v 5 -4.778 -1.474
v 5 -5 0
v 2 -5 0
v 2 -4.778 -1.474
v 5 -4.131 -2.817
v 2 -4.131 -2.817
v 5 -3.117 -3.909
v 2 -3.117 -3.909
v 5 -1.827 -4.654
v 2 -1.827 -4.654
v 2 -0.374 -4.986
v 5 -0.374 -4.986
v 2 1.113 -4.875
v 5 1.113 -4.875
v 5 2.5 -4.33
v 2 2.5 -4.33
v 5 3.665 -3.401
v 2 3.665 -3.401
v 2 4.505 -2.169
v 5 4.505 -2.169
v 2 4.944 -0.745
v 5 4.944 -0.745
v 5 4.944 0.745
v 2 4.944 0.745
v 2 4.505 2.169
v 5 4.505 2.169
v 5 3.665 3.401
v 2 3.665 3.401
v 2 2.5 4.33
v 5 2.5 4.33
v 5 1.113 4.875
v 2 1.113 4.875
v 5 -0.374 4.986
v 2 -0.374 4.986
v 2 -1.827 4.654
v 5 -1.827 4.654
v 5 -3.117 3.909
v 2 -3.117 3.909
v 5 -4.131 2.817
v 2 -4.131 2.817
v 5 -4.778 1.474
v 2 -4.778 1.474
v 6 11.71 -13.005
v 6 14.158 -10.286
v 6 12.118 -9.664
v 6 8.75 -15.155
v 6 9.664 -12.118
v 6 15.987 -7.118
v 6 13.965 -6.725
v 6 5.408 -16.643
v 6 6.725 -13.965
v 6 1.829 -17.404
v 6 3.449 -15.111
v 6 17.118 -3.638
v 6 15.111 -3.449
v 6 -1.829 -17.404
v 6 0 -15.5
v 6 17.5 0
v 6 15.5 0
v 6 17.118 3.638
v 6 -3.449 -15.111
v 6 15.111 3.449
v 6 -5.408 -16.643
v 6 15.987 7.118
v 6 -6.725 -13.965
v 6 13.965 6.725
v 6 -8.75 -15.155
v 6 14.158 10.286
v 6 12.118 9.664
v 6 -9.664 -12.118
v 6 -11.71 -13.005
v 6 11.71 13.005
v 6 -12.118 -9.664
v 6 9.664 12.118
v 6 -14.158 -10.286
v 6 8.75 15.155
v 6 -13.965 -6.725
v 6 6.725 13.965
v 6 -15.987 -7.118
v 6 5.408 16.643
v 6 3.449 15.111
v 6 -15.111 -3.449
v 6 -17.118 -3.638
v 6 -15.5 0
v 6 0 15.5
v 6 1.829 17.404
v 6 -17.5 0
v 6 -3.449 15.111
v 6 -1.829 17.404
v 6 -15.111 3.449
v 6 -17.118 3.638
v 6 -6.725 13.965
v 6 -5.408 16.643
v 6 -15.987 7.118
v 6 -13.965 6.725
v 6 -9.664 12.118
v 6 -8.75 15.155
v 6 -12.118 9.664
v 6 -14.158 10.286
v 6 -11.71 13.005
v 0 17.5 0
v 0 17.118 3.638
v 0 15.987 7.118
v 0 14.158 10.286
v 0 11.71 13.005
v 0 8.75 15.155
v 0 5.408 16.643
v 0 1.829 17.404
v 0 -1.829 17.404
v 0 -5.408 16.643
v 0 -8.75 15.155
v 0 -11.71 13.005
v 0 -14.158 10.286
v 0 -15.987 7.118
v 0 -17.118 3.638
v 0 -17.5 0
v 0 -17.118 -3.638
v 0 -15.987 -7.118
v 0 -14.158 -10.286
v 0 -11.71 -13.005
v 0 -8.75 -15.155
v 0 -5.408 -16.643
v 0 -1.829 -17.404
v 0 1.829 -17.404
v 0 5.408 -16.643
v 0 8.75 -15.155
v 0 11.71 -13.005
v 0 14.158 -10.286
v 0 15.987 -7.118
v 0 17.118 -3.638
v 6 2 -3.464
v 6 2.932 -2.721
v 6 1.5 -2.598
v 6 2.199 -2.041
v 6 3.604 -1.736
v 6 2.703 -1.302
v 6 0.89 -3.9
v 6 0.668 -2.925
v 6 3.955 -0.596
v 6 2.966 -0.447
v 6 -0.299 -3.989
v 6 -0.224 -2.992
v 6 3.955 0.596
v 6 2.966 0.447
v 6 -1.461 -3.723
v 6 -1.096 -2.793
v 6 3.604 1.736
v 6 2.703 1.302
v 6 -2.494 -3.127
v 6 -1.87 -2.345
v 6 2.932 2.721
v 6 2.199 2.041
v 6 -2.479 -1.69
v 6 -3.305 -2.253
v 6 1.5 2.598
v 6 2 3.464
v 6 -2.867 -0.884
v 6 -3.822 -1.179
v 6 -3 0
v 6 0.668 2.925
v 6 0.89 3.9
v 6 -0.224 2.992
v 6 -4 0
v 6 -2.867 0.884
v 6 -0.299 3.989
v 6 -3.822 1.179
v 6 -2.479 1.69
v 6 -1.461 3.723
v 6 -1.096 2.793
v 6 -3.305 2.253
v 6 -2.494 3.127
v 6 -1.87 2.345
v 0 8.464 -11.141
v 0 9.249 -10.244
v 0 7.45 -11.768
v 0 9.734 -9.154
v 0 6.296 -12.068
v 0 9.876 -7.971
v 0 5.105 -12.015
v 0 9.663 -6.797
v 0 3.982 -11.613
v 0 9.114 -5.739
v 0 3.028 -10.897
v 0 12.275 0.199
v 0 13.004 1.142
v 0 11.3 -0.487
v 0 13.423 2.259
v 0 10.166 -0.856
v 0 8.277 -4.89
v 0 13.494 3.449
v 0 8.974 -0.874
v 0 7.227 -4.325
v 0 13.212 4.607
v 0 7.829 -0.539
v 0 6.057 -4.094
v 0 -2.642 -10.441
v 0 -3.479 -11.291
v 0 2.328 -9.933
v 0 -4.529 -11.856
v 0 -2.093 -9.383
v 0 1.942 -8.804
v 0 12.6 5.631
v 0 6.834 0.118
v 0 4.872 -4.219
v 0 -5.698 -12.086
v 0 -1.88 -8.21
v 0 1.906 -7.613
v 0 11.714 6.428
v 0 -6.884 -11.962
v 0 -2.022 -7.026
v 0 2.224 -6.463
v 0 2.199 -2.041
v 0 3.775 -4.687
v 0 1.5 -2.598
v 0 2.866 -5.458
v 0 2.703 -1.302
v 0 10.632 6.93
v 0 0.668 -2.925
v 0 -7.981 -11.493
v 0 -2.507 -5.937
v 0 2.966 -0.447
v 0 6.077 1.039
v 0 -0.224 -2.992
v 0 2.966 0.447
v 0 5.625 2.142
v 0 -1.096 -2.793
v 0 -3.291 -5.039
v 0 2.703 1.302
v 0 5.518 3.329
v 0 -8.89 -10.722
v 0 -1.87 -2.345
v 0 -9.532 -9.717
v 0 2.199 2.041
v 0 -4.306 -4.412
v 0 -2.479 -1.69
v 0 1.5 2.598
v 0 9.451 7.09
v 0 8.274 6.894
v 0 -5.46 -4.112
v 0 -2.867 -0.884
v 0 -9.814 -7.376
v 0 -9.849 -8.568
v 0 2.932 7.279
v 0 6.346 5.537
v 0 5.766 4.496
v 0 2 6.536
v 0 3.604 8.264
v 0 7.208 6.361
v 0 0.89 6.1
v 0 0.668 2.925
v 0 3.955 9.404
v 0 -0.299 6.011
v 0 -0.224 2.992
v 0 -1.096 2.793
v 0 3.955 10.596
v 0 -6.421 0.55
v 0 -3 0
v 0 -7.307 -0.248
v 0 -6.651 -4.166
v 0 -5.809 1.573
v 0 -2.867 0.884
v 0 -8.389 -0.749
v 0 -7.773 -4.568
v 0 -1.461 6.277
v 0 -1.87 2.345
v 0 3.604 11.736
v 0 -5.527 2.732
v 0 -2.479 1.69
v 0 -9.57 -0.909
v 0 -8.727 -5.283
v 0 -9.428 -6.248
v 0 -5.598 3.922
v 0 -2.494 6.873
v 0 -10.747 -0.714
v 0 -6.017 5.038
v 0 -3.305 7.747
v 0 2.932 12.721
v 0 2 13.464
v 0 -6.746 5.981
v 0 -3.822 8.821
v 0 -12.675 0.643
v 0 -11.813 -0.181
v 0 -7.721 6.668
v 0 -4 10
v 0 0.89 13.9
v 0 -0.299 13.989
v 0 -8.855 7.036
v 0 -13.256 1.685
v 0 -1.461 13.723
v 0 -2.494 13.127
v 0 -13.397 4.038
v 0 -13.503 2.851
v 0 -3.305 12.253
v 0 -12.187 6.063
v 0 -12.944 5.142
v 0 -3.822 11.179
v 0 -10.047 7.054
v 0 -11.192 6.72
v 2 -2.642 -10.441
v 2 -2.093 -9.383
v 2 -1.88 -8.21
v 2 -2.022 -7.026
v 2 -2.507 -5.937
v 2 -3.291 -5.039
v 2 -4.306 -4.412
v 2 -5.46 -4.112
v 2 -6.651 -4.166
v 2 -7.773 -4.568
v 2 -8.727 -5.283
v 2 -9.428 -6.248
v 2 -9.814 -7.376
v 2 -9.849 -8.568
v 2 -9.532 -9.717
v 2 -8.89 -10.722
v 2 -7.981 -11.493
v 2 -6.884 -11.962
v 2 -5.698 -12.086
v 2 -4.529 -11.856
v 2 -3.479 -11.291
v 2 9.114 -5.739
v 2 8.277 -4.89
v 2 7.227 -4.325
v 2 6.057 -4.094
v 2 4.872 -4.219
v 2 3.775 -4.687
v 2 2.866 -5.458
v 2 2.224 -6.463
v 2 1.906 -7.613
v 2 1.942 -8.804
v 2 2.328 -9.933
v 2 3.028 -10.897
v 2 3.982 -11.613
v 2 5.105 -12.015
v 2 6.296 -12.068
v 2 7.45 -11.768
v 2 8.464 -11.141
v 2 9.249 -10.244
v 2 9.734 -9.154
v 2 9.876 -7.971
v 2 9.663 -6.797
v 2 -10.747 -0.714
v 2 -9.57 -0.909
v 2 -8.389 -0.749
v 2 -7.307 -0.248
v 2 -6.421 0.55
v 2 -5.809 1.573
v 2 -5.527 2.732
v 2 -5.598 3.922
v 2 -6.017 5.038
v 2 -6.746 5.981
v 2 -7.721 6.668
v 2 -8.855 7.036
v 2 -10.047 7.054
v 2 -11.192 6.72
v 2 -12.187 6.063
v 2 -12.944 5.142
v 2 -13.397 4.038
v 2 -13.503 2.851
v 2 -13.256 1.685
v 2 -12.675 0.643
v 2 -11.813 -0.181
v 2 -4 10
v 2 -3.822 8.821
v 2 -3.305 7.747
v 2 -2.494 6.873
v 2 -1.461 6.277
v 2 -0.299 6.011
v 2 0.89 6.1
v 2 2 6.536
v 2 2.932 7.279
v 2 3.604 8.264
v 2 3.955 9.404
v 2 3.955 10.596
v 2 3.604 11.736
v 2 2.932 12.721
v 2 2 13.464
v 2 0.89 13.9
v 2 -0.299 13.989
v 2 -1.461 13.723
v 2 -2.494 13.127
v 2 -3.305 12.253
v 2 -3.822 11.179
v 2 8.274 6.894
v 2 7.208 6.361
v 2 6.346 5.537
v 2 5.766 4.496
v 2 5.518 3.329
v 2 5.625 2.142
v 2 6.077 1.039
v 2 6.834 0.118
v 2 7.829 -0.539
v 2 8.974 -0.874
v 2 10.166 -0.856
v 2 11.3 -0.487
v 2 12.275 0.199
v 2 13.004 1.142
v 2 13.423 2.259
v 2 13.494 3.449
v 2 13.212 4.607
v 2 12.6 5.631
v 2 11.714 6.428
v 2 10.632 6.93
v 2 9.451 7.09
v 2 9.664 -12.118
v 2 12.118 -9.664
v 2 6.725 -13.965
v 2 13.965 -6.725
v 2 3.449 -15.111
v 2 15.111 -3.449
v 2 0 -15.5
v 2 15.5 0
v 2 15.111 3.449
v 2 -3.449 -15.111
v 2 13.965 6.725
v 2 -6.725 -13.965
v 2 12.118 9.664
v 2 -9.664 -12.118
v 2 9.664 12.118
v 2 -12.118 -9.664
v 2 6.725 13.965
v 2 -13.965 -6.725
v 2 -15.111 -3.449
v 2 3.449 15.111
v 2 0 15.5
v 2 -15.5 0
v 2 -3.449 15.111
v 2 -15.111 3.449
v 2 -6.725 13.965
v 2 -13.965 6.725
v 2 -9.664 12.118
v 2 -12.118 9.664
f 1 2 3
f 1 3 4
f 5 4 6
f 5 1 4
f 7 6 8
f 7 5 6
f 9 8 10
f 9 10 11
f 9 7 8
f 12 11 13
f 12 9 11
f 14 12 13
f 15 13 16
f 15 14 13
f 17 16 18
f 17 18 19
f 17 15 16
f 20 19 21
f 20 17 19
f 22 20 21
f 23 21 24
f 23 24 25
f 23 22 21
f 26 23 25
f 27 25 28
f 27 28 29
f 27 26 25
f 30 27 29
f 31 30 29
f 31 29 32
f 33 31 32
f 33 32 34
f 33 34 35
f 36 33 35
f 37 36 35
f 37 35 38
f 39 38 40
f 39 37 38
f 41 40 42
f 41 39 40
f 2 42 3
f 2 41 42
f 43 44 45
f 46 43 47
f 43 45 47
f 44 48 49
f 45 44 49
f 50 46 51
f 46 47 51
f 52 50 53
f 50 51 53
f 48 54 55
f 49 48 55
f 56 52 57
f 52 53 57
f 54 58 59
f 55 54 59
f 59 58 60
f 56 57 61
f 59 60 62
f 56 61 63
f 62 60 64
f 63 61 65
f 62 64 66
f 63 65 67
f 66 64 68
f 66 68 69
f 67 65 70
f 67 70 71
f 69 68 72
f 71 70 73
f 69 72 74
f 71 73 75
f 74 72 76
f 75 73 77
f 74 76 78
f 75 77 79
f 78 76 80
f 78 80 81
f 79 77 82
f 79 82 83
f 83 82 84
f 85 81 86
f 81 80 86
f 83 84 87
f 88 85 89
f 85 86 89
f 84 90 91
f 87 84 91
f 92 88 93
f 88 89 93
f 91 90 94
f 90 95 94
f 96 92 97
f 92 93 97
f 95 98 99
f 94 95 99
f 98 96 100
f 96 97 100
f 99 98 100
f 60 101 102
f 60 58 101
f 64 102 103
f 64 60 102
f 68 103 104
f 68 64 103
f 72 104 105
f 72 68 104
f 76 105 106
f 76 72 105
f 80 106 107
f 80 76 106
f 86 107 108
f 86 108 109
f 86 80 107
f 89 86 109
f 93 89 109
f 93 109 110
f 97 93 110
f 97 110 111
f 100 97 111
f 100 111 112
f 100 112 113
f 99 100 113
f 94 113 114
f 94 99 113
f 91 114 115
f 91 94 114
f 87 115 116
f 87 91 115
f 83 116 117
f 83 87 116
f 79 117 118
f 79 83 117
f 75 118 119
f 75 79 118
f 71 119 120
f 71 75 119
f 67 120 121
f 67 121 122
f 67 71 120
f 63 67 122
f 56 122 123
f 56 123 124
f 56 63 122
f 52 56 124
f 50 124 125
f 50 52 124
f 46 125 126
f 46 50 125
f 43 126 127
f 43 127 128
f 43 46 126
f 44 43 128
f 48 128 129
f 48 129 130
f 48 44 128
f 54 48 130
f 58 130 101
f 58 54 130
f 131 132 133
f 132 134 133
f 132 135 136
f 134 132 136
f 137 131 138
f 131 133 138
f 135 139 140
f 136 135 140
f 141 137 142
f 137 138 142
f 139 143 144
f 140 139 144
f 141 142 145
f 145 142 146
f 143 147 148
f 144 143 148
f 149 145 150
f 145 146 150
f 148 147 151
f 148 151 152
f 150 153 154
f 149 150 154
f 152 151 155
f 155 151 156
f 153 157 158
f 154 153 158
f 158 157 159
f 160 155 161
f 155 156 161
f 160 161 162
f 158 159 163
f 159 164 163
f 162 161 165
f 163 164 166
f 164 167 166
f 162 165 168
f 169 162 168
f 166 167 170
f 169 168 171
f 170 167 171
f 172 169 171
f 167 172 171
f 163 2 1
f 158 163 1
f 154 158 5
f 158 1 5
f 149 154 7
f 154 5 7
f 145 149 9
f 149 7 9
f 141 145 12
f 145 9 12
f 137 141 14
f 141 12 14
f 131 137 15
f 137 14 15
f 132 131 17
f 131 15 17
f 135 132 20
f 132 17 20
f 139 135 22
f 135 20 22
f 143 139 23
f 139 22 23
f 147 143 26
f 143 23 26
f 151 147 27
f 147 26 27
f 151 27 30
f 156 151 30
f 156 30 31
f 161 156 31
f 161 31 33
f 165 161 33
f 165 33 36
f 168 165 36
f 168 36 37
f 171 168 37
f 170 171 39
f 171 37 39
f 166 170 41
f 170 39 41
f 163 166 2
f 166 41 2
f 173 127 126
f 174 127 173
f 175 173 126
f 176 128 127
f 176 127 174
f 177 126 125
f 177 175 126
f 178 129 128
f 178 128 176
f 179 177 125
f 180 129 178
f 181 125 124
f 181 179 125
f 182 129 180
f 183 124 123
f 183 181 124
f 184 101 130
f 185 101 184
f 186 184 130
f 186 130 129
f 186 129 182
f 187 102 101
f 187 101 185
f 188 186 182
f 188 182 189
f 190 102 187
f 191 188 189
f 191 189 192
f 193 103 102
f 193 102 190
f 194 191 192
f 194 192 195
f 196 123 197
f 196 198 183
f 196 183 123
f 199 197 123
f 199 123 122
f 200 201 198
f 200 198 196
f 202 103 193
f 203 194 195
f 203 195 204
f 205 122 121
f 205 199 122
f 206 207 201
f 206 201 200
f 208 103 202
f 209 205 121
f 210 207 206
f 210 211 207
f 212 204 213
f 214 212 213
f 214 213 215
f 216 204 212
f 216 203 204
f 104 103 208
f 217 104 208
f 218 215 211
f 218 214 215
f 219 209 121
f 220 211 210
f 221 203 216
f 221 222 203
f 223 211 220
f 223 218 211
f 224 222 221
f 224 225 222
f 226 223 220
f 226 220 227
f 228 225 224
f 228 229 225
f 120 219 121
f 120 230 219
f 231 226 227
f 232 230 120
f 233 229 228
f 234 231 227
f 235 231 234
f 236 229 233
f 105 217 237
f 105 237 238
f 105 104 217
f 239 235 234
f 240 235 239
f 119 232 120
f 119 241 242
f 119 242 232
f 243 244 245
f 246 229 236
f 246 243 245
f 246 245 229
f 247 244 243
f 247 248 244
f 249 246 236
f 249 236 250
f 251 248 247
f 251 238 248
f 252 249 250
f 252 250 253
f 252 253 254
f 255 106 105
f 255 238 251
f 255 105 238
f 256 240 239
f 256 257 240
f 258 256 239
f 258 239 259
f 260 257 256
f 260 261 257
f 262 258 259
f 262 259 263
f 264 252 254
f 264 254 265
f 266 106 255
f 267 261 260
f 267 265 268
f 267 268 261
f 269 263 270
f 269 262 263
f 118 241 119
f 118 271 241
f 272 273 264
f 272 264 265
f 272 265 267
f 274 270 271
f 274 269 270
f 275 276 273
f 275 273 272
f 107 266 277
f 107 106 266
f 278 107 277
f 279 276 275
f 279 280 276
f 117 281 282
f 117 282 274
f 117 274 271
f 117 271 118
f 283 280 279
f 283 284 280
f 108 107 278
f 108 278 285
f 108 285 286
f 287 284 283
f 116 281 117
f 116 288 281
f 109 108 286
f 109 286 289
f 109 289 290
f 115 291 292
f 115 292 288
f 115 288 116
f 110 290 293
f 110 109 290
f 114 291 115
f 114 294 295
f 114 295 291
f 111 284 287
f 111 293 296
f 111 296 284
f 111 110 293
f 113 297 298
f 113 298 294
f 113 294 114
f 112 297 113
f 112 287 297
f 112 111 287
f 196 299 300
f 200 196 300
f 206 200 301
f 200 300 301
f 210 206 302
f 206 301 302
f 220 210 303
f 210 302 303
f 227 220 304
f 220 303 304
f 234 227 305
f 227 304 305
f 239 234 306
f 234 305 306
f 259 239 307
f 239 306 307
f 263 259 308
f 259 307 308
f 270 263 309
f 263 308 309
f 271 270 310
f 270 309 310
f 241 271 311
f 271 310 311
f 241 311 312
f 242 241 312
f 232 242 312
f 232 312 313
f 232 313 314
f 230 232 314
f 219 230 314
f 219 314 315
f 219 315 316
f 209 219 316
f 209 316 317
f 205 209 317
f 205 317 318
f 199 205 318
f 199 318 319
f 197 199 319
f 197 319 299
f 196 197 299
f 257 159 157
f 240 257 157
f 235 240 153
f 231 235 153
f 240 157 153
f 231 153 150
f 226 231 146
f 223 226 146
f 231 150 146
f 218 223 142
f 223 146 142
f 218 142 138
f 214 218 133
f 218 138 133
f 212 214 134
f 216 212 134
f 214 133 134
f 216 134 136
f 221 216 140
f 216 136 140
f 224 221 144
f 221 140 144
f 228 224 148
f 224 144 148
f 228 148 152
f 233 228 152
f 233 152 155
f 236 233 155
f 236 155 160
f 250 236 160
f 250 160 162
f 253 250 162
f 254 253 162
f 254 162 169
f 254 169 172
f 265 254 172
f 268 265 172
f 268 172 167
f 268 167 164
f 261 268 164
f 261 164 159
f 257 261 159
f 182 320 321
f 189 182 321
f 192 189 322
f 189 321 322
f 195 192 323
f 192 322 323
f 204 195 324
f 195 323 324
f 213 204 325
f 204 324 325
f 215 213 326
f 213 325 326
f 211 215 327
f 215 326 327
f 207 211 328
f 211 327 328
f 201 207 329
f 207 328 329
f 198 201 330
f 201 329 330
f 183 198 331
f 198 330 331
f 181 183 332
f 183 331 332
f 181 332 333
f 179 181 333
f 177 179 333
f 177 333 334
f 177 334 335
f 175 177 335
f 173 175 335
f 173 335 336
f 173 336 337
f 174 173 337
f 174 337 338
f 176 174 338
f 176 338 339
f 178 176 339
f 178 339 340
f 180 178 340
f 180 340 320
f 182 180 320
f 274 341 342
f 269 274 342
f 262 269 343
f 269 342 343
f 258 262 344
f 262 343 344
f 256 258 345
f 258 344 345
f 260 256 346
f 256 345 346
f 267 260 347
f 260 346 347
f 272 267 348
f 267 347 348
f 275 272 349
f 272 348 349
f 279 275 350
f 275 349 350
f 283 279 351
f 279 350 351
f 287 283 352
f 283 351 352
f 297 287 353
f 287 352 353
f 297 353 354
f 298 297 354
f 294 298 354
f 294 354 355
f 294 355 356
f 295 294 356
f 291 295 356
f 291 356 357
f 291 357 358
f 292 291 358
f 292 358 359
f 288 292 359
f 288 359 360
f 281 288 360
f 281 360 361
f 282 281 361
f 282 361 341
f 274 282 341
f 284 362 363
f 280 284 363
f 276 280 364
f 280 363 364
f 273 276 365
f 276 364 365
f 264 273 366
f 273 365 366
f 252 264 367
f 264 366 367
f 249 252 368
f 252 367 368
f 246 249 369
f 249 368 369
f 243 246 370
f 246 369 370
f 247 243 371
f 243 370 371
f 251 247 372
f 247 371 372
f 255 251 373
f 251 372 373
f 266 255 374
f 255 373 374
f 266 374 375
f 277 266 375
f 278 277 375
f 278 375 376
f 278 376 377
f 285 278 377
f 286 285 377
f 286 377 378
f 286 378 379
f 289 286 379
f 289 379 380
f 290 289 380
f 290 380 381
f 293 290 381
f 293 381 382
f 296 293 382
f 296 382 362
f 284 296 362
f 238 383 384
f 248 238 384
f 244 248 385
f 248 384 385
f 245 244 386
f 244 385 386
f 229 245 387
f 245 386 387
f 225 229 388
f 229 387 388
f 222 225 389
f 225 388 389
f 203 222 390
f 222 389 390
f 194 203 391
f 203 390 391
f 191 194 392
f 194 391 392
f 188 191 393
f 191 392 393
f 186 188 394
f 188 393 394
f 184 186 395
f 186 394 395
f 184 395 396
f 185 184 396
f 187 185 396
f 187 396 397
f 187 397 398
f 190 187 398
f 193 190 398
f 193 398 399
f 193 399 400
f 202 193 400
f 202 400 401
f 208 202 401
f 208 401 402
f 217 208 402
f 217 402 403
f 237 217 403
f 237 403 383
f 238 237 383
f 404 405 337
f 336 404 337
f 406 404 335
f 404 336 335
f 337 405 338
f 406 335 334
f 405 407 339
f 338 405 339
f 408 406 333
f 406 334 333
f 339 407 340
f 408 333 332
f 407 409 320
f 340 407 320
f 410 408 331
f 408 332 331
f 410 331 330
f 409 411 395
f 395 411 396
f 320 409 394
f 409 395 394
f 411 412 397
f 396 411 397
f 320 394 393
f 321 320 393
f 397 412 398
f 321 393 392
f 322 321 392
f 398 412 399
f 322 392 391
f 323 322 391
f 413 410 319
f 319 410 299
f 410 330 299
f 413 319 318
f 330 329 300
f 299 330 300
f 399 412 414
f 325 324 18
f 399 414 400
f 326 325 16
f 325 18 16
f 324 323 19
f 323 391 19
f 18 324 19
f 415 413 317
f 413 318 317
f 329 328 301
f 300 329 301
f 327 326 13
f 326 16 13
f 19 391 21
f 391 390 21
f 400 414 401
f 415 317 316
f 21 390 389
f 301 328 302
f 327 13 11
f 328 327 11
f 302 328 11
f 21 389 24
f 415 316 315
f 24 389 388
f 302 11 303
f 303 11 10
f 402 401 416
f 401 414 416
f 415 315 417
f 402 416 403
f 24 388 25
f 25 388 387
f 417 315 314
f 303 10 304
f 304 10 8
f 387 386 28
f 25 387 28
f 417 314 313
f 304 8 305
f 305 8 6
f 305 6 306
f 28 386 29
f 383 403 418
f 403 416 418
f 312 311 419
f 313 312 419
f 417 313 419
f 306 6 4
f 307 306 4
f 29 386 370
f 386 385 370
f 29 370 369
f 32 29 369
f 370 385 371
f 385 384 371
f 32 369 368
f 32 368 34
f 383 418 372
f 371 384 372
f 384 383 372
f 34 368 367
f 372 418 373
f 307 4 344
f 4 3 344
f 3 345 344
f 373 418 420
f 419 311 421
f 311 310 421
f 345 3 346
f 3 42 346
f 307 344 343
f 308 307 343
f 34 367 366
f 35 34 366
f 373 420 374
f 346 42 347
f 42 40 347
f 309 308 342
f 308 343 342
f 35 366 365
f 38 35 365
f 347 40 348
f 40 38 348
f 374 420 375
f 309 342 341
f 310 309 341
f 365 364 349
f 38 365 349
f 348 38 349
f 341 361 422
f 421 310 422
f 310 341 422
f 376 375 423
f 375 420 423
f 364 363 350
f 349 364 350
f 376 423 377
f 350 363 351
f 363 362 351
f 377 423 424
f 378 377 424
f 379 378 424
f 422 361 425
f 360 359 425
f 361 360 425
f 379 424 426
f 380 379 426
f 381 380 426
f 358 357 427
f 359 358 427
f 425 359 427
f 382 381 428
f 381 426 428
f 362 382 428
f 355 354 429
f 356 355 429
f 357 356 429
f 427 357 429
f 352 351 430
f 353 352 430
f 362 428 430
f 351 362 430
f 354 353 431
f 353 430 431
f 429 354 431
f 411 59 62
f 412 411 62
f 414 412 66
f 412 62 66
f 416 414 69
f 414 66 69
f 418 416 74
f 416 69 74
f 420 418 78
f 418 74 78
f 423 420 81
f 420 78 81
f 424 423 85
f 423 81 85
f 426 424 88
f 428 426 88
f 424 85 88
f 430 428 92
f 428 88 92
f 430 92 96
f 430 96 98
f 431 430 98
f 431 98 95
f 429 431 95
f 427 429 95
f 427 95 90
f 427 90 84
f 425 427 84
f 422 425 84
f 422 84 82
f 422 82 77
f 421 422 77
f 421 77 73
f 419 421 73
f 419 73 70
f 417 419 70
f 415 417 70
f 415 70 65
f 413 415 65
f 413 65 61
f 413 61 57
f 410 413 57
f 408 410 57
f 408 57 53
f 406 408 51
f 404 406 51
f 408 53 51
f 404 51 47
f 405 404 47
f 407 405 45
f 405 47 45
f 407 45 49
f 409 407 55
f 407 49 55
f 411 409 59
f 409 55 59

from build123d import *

# Parameters (mm, degrees)
F0_W            = 6
F0_H            = 17.5
F3_D            = 6
F4_T            = -2
F6_D            = 8
F6_COPIES_COUNT = 5
F7_SIZE         = 1


# Not quite as in the source:
# - a pattern or mirror of a feature is missing from the dataset's text; its kind, count and spacing are read off the source's solid


with BuildPart() as f1:
    # F0 (on Top) → F1 (revolve)
    with BuildSketch(Plane.XY):
        with Locations((3, 8.75)):
            Rectangle(F0_W, F0_H)
    revolve(axis=Axis((3, 0, 0), (1, 0, 0)))

    # F3 (through all)
    with Locations(Plane(origin=(0, 0, 0), x_dir=(0, 1, 0), z_dir=(-1, 0, 0))):
        with Locations((0, 0)):
            Hole(F3_D / 2)

    # F4
    f4_openings = [f1.faces().sort_by_distance(p)[0] for p in [
        (6, -17.005025, 0),
    ]]
    offset(amount=F4_T, openings=f4_openings)

    # F6 (through all)
    with Locations(Plane(origin=(0, 0, 0), x_dir=(0, 1, 0), z_dir=(-1, 0, 0))):
        with Locations((0, -10)):
            f6 = Hole(F6_D / 2)

    # F6_copies: F6 ×5 about axis
    f6_copies_axis = Axis((0, 0, 0), (1, 0, 0))
    for i in range(1, F6_COPIES_COUNT):
        add(f6.rotate(f6_copies_axis, i * 360 / F6_COPIES_COUNT), mode=Mode.SUBTRACT)

    # F7
    f7_edges = [f1.edges().sort_by_distance(p)[0] for p in [
        (6, -5, 0),
    ]]
    chamfer(f7_edges, length=F7_SIZE)


solid = f1.part
